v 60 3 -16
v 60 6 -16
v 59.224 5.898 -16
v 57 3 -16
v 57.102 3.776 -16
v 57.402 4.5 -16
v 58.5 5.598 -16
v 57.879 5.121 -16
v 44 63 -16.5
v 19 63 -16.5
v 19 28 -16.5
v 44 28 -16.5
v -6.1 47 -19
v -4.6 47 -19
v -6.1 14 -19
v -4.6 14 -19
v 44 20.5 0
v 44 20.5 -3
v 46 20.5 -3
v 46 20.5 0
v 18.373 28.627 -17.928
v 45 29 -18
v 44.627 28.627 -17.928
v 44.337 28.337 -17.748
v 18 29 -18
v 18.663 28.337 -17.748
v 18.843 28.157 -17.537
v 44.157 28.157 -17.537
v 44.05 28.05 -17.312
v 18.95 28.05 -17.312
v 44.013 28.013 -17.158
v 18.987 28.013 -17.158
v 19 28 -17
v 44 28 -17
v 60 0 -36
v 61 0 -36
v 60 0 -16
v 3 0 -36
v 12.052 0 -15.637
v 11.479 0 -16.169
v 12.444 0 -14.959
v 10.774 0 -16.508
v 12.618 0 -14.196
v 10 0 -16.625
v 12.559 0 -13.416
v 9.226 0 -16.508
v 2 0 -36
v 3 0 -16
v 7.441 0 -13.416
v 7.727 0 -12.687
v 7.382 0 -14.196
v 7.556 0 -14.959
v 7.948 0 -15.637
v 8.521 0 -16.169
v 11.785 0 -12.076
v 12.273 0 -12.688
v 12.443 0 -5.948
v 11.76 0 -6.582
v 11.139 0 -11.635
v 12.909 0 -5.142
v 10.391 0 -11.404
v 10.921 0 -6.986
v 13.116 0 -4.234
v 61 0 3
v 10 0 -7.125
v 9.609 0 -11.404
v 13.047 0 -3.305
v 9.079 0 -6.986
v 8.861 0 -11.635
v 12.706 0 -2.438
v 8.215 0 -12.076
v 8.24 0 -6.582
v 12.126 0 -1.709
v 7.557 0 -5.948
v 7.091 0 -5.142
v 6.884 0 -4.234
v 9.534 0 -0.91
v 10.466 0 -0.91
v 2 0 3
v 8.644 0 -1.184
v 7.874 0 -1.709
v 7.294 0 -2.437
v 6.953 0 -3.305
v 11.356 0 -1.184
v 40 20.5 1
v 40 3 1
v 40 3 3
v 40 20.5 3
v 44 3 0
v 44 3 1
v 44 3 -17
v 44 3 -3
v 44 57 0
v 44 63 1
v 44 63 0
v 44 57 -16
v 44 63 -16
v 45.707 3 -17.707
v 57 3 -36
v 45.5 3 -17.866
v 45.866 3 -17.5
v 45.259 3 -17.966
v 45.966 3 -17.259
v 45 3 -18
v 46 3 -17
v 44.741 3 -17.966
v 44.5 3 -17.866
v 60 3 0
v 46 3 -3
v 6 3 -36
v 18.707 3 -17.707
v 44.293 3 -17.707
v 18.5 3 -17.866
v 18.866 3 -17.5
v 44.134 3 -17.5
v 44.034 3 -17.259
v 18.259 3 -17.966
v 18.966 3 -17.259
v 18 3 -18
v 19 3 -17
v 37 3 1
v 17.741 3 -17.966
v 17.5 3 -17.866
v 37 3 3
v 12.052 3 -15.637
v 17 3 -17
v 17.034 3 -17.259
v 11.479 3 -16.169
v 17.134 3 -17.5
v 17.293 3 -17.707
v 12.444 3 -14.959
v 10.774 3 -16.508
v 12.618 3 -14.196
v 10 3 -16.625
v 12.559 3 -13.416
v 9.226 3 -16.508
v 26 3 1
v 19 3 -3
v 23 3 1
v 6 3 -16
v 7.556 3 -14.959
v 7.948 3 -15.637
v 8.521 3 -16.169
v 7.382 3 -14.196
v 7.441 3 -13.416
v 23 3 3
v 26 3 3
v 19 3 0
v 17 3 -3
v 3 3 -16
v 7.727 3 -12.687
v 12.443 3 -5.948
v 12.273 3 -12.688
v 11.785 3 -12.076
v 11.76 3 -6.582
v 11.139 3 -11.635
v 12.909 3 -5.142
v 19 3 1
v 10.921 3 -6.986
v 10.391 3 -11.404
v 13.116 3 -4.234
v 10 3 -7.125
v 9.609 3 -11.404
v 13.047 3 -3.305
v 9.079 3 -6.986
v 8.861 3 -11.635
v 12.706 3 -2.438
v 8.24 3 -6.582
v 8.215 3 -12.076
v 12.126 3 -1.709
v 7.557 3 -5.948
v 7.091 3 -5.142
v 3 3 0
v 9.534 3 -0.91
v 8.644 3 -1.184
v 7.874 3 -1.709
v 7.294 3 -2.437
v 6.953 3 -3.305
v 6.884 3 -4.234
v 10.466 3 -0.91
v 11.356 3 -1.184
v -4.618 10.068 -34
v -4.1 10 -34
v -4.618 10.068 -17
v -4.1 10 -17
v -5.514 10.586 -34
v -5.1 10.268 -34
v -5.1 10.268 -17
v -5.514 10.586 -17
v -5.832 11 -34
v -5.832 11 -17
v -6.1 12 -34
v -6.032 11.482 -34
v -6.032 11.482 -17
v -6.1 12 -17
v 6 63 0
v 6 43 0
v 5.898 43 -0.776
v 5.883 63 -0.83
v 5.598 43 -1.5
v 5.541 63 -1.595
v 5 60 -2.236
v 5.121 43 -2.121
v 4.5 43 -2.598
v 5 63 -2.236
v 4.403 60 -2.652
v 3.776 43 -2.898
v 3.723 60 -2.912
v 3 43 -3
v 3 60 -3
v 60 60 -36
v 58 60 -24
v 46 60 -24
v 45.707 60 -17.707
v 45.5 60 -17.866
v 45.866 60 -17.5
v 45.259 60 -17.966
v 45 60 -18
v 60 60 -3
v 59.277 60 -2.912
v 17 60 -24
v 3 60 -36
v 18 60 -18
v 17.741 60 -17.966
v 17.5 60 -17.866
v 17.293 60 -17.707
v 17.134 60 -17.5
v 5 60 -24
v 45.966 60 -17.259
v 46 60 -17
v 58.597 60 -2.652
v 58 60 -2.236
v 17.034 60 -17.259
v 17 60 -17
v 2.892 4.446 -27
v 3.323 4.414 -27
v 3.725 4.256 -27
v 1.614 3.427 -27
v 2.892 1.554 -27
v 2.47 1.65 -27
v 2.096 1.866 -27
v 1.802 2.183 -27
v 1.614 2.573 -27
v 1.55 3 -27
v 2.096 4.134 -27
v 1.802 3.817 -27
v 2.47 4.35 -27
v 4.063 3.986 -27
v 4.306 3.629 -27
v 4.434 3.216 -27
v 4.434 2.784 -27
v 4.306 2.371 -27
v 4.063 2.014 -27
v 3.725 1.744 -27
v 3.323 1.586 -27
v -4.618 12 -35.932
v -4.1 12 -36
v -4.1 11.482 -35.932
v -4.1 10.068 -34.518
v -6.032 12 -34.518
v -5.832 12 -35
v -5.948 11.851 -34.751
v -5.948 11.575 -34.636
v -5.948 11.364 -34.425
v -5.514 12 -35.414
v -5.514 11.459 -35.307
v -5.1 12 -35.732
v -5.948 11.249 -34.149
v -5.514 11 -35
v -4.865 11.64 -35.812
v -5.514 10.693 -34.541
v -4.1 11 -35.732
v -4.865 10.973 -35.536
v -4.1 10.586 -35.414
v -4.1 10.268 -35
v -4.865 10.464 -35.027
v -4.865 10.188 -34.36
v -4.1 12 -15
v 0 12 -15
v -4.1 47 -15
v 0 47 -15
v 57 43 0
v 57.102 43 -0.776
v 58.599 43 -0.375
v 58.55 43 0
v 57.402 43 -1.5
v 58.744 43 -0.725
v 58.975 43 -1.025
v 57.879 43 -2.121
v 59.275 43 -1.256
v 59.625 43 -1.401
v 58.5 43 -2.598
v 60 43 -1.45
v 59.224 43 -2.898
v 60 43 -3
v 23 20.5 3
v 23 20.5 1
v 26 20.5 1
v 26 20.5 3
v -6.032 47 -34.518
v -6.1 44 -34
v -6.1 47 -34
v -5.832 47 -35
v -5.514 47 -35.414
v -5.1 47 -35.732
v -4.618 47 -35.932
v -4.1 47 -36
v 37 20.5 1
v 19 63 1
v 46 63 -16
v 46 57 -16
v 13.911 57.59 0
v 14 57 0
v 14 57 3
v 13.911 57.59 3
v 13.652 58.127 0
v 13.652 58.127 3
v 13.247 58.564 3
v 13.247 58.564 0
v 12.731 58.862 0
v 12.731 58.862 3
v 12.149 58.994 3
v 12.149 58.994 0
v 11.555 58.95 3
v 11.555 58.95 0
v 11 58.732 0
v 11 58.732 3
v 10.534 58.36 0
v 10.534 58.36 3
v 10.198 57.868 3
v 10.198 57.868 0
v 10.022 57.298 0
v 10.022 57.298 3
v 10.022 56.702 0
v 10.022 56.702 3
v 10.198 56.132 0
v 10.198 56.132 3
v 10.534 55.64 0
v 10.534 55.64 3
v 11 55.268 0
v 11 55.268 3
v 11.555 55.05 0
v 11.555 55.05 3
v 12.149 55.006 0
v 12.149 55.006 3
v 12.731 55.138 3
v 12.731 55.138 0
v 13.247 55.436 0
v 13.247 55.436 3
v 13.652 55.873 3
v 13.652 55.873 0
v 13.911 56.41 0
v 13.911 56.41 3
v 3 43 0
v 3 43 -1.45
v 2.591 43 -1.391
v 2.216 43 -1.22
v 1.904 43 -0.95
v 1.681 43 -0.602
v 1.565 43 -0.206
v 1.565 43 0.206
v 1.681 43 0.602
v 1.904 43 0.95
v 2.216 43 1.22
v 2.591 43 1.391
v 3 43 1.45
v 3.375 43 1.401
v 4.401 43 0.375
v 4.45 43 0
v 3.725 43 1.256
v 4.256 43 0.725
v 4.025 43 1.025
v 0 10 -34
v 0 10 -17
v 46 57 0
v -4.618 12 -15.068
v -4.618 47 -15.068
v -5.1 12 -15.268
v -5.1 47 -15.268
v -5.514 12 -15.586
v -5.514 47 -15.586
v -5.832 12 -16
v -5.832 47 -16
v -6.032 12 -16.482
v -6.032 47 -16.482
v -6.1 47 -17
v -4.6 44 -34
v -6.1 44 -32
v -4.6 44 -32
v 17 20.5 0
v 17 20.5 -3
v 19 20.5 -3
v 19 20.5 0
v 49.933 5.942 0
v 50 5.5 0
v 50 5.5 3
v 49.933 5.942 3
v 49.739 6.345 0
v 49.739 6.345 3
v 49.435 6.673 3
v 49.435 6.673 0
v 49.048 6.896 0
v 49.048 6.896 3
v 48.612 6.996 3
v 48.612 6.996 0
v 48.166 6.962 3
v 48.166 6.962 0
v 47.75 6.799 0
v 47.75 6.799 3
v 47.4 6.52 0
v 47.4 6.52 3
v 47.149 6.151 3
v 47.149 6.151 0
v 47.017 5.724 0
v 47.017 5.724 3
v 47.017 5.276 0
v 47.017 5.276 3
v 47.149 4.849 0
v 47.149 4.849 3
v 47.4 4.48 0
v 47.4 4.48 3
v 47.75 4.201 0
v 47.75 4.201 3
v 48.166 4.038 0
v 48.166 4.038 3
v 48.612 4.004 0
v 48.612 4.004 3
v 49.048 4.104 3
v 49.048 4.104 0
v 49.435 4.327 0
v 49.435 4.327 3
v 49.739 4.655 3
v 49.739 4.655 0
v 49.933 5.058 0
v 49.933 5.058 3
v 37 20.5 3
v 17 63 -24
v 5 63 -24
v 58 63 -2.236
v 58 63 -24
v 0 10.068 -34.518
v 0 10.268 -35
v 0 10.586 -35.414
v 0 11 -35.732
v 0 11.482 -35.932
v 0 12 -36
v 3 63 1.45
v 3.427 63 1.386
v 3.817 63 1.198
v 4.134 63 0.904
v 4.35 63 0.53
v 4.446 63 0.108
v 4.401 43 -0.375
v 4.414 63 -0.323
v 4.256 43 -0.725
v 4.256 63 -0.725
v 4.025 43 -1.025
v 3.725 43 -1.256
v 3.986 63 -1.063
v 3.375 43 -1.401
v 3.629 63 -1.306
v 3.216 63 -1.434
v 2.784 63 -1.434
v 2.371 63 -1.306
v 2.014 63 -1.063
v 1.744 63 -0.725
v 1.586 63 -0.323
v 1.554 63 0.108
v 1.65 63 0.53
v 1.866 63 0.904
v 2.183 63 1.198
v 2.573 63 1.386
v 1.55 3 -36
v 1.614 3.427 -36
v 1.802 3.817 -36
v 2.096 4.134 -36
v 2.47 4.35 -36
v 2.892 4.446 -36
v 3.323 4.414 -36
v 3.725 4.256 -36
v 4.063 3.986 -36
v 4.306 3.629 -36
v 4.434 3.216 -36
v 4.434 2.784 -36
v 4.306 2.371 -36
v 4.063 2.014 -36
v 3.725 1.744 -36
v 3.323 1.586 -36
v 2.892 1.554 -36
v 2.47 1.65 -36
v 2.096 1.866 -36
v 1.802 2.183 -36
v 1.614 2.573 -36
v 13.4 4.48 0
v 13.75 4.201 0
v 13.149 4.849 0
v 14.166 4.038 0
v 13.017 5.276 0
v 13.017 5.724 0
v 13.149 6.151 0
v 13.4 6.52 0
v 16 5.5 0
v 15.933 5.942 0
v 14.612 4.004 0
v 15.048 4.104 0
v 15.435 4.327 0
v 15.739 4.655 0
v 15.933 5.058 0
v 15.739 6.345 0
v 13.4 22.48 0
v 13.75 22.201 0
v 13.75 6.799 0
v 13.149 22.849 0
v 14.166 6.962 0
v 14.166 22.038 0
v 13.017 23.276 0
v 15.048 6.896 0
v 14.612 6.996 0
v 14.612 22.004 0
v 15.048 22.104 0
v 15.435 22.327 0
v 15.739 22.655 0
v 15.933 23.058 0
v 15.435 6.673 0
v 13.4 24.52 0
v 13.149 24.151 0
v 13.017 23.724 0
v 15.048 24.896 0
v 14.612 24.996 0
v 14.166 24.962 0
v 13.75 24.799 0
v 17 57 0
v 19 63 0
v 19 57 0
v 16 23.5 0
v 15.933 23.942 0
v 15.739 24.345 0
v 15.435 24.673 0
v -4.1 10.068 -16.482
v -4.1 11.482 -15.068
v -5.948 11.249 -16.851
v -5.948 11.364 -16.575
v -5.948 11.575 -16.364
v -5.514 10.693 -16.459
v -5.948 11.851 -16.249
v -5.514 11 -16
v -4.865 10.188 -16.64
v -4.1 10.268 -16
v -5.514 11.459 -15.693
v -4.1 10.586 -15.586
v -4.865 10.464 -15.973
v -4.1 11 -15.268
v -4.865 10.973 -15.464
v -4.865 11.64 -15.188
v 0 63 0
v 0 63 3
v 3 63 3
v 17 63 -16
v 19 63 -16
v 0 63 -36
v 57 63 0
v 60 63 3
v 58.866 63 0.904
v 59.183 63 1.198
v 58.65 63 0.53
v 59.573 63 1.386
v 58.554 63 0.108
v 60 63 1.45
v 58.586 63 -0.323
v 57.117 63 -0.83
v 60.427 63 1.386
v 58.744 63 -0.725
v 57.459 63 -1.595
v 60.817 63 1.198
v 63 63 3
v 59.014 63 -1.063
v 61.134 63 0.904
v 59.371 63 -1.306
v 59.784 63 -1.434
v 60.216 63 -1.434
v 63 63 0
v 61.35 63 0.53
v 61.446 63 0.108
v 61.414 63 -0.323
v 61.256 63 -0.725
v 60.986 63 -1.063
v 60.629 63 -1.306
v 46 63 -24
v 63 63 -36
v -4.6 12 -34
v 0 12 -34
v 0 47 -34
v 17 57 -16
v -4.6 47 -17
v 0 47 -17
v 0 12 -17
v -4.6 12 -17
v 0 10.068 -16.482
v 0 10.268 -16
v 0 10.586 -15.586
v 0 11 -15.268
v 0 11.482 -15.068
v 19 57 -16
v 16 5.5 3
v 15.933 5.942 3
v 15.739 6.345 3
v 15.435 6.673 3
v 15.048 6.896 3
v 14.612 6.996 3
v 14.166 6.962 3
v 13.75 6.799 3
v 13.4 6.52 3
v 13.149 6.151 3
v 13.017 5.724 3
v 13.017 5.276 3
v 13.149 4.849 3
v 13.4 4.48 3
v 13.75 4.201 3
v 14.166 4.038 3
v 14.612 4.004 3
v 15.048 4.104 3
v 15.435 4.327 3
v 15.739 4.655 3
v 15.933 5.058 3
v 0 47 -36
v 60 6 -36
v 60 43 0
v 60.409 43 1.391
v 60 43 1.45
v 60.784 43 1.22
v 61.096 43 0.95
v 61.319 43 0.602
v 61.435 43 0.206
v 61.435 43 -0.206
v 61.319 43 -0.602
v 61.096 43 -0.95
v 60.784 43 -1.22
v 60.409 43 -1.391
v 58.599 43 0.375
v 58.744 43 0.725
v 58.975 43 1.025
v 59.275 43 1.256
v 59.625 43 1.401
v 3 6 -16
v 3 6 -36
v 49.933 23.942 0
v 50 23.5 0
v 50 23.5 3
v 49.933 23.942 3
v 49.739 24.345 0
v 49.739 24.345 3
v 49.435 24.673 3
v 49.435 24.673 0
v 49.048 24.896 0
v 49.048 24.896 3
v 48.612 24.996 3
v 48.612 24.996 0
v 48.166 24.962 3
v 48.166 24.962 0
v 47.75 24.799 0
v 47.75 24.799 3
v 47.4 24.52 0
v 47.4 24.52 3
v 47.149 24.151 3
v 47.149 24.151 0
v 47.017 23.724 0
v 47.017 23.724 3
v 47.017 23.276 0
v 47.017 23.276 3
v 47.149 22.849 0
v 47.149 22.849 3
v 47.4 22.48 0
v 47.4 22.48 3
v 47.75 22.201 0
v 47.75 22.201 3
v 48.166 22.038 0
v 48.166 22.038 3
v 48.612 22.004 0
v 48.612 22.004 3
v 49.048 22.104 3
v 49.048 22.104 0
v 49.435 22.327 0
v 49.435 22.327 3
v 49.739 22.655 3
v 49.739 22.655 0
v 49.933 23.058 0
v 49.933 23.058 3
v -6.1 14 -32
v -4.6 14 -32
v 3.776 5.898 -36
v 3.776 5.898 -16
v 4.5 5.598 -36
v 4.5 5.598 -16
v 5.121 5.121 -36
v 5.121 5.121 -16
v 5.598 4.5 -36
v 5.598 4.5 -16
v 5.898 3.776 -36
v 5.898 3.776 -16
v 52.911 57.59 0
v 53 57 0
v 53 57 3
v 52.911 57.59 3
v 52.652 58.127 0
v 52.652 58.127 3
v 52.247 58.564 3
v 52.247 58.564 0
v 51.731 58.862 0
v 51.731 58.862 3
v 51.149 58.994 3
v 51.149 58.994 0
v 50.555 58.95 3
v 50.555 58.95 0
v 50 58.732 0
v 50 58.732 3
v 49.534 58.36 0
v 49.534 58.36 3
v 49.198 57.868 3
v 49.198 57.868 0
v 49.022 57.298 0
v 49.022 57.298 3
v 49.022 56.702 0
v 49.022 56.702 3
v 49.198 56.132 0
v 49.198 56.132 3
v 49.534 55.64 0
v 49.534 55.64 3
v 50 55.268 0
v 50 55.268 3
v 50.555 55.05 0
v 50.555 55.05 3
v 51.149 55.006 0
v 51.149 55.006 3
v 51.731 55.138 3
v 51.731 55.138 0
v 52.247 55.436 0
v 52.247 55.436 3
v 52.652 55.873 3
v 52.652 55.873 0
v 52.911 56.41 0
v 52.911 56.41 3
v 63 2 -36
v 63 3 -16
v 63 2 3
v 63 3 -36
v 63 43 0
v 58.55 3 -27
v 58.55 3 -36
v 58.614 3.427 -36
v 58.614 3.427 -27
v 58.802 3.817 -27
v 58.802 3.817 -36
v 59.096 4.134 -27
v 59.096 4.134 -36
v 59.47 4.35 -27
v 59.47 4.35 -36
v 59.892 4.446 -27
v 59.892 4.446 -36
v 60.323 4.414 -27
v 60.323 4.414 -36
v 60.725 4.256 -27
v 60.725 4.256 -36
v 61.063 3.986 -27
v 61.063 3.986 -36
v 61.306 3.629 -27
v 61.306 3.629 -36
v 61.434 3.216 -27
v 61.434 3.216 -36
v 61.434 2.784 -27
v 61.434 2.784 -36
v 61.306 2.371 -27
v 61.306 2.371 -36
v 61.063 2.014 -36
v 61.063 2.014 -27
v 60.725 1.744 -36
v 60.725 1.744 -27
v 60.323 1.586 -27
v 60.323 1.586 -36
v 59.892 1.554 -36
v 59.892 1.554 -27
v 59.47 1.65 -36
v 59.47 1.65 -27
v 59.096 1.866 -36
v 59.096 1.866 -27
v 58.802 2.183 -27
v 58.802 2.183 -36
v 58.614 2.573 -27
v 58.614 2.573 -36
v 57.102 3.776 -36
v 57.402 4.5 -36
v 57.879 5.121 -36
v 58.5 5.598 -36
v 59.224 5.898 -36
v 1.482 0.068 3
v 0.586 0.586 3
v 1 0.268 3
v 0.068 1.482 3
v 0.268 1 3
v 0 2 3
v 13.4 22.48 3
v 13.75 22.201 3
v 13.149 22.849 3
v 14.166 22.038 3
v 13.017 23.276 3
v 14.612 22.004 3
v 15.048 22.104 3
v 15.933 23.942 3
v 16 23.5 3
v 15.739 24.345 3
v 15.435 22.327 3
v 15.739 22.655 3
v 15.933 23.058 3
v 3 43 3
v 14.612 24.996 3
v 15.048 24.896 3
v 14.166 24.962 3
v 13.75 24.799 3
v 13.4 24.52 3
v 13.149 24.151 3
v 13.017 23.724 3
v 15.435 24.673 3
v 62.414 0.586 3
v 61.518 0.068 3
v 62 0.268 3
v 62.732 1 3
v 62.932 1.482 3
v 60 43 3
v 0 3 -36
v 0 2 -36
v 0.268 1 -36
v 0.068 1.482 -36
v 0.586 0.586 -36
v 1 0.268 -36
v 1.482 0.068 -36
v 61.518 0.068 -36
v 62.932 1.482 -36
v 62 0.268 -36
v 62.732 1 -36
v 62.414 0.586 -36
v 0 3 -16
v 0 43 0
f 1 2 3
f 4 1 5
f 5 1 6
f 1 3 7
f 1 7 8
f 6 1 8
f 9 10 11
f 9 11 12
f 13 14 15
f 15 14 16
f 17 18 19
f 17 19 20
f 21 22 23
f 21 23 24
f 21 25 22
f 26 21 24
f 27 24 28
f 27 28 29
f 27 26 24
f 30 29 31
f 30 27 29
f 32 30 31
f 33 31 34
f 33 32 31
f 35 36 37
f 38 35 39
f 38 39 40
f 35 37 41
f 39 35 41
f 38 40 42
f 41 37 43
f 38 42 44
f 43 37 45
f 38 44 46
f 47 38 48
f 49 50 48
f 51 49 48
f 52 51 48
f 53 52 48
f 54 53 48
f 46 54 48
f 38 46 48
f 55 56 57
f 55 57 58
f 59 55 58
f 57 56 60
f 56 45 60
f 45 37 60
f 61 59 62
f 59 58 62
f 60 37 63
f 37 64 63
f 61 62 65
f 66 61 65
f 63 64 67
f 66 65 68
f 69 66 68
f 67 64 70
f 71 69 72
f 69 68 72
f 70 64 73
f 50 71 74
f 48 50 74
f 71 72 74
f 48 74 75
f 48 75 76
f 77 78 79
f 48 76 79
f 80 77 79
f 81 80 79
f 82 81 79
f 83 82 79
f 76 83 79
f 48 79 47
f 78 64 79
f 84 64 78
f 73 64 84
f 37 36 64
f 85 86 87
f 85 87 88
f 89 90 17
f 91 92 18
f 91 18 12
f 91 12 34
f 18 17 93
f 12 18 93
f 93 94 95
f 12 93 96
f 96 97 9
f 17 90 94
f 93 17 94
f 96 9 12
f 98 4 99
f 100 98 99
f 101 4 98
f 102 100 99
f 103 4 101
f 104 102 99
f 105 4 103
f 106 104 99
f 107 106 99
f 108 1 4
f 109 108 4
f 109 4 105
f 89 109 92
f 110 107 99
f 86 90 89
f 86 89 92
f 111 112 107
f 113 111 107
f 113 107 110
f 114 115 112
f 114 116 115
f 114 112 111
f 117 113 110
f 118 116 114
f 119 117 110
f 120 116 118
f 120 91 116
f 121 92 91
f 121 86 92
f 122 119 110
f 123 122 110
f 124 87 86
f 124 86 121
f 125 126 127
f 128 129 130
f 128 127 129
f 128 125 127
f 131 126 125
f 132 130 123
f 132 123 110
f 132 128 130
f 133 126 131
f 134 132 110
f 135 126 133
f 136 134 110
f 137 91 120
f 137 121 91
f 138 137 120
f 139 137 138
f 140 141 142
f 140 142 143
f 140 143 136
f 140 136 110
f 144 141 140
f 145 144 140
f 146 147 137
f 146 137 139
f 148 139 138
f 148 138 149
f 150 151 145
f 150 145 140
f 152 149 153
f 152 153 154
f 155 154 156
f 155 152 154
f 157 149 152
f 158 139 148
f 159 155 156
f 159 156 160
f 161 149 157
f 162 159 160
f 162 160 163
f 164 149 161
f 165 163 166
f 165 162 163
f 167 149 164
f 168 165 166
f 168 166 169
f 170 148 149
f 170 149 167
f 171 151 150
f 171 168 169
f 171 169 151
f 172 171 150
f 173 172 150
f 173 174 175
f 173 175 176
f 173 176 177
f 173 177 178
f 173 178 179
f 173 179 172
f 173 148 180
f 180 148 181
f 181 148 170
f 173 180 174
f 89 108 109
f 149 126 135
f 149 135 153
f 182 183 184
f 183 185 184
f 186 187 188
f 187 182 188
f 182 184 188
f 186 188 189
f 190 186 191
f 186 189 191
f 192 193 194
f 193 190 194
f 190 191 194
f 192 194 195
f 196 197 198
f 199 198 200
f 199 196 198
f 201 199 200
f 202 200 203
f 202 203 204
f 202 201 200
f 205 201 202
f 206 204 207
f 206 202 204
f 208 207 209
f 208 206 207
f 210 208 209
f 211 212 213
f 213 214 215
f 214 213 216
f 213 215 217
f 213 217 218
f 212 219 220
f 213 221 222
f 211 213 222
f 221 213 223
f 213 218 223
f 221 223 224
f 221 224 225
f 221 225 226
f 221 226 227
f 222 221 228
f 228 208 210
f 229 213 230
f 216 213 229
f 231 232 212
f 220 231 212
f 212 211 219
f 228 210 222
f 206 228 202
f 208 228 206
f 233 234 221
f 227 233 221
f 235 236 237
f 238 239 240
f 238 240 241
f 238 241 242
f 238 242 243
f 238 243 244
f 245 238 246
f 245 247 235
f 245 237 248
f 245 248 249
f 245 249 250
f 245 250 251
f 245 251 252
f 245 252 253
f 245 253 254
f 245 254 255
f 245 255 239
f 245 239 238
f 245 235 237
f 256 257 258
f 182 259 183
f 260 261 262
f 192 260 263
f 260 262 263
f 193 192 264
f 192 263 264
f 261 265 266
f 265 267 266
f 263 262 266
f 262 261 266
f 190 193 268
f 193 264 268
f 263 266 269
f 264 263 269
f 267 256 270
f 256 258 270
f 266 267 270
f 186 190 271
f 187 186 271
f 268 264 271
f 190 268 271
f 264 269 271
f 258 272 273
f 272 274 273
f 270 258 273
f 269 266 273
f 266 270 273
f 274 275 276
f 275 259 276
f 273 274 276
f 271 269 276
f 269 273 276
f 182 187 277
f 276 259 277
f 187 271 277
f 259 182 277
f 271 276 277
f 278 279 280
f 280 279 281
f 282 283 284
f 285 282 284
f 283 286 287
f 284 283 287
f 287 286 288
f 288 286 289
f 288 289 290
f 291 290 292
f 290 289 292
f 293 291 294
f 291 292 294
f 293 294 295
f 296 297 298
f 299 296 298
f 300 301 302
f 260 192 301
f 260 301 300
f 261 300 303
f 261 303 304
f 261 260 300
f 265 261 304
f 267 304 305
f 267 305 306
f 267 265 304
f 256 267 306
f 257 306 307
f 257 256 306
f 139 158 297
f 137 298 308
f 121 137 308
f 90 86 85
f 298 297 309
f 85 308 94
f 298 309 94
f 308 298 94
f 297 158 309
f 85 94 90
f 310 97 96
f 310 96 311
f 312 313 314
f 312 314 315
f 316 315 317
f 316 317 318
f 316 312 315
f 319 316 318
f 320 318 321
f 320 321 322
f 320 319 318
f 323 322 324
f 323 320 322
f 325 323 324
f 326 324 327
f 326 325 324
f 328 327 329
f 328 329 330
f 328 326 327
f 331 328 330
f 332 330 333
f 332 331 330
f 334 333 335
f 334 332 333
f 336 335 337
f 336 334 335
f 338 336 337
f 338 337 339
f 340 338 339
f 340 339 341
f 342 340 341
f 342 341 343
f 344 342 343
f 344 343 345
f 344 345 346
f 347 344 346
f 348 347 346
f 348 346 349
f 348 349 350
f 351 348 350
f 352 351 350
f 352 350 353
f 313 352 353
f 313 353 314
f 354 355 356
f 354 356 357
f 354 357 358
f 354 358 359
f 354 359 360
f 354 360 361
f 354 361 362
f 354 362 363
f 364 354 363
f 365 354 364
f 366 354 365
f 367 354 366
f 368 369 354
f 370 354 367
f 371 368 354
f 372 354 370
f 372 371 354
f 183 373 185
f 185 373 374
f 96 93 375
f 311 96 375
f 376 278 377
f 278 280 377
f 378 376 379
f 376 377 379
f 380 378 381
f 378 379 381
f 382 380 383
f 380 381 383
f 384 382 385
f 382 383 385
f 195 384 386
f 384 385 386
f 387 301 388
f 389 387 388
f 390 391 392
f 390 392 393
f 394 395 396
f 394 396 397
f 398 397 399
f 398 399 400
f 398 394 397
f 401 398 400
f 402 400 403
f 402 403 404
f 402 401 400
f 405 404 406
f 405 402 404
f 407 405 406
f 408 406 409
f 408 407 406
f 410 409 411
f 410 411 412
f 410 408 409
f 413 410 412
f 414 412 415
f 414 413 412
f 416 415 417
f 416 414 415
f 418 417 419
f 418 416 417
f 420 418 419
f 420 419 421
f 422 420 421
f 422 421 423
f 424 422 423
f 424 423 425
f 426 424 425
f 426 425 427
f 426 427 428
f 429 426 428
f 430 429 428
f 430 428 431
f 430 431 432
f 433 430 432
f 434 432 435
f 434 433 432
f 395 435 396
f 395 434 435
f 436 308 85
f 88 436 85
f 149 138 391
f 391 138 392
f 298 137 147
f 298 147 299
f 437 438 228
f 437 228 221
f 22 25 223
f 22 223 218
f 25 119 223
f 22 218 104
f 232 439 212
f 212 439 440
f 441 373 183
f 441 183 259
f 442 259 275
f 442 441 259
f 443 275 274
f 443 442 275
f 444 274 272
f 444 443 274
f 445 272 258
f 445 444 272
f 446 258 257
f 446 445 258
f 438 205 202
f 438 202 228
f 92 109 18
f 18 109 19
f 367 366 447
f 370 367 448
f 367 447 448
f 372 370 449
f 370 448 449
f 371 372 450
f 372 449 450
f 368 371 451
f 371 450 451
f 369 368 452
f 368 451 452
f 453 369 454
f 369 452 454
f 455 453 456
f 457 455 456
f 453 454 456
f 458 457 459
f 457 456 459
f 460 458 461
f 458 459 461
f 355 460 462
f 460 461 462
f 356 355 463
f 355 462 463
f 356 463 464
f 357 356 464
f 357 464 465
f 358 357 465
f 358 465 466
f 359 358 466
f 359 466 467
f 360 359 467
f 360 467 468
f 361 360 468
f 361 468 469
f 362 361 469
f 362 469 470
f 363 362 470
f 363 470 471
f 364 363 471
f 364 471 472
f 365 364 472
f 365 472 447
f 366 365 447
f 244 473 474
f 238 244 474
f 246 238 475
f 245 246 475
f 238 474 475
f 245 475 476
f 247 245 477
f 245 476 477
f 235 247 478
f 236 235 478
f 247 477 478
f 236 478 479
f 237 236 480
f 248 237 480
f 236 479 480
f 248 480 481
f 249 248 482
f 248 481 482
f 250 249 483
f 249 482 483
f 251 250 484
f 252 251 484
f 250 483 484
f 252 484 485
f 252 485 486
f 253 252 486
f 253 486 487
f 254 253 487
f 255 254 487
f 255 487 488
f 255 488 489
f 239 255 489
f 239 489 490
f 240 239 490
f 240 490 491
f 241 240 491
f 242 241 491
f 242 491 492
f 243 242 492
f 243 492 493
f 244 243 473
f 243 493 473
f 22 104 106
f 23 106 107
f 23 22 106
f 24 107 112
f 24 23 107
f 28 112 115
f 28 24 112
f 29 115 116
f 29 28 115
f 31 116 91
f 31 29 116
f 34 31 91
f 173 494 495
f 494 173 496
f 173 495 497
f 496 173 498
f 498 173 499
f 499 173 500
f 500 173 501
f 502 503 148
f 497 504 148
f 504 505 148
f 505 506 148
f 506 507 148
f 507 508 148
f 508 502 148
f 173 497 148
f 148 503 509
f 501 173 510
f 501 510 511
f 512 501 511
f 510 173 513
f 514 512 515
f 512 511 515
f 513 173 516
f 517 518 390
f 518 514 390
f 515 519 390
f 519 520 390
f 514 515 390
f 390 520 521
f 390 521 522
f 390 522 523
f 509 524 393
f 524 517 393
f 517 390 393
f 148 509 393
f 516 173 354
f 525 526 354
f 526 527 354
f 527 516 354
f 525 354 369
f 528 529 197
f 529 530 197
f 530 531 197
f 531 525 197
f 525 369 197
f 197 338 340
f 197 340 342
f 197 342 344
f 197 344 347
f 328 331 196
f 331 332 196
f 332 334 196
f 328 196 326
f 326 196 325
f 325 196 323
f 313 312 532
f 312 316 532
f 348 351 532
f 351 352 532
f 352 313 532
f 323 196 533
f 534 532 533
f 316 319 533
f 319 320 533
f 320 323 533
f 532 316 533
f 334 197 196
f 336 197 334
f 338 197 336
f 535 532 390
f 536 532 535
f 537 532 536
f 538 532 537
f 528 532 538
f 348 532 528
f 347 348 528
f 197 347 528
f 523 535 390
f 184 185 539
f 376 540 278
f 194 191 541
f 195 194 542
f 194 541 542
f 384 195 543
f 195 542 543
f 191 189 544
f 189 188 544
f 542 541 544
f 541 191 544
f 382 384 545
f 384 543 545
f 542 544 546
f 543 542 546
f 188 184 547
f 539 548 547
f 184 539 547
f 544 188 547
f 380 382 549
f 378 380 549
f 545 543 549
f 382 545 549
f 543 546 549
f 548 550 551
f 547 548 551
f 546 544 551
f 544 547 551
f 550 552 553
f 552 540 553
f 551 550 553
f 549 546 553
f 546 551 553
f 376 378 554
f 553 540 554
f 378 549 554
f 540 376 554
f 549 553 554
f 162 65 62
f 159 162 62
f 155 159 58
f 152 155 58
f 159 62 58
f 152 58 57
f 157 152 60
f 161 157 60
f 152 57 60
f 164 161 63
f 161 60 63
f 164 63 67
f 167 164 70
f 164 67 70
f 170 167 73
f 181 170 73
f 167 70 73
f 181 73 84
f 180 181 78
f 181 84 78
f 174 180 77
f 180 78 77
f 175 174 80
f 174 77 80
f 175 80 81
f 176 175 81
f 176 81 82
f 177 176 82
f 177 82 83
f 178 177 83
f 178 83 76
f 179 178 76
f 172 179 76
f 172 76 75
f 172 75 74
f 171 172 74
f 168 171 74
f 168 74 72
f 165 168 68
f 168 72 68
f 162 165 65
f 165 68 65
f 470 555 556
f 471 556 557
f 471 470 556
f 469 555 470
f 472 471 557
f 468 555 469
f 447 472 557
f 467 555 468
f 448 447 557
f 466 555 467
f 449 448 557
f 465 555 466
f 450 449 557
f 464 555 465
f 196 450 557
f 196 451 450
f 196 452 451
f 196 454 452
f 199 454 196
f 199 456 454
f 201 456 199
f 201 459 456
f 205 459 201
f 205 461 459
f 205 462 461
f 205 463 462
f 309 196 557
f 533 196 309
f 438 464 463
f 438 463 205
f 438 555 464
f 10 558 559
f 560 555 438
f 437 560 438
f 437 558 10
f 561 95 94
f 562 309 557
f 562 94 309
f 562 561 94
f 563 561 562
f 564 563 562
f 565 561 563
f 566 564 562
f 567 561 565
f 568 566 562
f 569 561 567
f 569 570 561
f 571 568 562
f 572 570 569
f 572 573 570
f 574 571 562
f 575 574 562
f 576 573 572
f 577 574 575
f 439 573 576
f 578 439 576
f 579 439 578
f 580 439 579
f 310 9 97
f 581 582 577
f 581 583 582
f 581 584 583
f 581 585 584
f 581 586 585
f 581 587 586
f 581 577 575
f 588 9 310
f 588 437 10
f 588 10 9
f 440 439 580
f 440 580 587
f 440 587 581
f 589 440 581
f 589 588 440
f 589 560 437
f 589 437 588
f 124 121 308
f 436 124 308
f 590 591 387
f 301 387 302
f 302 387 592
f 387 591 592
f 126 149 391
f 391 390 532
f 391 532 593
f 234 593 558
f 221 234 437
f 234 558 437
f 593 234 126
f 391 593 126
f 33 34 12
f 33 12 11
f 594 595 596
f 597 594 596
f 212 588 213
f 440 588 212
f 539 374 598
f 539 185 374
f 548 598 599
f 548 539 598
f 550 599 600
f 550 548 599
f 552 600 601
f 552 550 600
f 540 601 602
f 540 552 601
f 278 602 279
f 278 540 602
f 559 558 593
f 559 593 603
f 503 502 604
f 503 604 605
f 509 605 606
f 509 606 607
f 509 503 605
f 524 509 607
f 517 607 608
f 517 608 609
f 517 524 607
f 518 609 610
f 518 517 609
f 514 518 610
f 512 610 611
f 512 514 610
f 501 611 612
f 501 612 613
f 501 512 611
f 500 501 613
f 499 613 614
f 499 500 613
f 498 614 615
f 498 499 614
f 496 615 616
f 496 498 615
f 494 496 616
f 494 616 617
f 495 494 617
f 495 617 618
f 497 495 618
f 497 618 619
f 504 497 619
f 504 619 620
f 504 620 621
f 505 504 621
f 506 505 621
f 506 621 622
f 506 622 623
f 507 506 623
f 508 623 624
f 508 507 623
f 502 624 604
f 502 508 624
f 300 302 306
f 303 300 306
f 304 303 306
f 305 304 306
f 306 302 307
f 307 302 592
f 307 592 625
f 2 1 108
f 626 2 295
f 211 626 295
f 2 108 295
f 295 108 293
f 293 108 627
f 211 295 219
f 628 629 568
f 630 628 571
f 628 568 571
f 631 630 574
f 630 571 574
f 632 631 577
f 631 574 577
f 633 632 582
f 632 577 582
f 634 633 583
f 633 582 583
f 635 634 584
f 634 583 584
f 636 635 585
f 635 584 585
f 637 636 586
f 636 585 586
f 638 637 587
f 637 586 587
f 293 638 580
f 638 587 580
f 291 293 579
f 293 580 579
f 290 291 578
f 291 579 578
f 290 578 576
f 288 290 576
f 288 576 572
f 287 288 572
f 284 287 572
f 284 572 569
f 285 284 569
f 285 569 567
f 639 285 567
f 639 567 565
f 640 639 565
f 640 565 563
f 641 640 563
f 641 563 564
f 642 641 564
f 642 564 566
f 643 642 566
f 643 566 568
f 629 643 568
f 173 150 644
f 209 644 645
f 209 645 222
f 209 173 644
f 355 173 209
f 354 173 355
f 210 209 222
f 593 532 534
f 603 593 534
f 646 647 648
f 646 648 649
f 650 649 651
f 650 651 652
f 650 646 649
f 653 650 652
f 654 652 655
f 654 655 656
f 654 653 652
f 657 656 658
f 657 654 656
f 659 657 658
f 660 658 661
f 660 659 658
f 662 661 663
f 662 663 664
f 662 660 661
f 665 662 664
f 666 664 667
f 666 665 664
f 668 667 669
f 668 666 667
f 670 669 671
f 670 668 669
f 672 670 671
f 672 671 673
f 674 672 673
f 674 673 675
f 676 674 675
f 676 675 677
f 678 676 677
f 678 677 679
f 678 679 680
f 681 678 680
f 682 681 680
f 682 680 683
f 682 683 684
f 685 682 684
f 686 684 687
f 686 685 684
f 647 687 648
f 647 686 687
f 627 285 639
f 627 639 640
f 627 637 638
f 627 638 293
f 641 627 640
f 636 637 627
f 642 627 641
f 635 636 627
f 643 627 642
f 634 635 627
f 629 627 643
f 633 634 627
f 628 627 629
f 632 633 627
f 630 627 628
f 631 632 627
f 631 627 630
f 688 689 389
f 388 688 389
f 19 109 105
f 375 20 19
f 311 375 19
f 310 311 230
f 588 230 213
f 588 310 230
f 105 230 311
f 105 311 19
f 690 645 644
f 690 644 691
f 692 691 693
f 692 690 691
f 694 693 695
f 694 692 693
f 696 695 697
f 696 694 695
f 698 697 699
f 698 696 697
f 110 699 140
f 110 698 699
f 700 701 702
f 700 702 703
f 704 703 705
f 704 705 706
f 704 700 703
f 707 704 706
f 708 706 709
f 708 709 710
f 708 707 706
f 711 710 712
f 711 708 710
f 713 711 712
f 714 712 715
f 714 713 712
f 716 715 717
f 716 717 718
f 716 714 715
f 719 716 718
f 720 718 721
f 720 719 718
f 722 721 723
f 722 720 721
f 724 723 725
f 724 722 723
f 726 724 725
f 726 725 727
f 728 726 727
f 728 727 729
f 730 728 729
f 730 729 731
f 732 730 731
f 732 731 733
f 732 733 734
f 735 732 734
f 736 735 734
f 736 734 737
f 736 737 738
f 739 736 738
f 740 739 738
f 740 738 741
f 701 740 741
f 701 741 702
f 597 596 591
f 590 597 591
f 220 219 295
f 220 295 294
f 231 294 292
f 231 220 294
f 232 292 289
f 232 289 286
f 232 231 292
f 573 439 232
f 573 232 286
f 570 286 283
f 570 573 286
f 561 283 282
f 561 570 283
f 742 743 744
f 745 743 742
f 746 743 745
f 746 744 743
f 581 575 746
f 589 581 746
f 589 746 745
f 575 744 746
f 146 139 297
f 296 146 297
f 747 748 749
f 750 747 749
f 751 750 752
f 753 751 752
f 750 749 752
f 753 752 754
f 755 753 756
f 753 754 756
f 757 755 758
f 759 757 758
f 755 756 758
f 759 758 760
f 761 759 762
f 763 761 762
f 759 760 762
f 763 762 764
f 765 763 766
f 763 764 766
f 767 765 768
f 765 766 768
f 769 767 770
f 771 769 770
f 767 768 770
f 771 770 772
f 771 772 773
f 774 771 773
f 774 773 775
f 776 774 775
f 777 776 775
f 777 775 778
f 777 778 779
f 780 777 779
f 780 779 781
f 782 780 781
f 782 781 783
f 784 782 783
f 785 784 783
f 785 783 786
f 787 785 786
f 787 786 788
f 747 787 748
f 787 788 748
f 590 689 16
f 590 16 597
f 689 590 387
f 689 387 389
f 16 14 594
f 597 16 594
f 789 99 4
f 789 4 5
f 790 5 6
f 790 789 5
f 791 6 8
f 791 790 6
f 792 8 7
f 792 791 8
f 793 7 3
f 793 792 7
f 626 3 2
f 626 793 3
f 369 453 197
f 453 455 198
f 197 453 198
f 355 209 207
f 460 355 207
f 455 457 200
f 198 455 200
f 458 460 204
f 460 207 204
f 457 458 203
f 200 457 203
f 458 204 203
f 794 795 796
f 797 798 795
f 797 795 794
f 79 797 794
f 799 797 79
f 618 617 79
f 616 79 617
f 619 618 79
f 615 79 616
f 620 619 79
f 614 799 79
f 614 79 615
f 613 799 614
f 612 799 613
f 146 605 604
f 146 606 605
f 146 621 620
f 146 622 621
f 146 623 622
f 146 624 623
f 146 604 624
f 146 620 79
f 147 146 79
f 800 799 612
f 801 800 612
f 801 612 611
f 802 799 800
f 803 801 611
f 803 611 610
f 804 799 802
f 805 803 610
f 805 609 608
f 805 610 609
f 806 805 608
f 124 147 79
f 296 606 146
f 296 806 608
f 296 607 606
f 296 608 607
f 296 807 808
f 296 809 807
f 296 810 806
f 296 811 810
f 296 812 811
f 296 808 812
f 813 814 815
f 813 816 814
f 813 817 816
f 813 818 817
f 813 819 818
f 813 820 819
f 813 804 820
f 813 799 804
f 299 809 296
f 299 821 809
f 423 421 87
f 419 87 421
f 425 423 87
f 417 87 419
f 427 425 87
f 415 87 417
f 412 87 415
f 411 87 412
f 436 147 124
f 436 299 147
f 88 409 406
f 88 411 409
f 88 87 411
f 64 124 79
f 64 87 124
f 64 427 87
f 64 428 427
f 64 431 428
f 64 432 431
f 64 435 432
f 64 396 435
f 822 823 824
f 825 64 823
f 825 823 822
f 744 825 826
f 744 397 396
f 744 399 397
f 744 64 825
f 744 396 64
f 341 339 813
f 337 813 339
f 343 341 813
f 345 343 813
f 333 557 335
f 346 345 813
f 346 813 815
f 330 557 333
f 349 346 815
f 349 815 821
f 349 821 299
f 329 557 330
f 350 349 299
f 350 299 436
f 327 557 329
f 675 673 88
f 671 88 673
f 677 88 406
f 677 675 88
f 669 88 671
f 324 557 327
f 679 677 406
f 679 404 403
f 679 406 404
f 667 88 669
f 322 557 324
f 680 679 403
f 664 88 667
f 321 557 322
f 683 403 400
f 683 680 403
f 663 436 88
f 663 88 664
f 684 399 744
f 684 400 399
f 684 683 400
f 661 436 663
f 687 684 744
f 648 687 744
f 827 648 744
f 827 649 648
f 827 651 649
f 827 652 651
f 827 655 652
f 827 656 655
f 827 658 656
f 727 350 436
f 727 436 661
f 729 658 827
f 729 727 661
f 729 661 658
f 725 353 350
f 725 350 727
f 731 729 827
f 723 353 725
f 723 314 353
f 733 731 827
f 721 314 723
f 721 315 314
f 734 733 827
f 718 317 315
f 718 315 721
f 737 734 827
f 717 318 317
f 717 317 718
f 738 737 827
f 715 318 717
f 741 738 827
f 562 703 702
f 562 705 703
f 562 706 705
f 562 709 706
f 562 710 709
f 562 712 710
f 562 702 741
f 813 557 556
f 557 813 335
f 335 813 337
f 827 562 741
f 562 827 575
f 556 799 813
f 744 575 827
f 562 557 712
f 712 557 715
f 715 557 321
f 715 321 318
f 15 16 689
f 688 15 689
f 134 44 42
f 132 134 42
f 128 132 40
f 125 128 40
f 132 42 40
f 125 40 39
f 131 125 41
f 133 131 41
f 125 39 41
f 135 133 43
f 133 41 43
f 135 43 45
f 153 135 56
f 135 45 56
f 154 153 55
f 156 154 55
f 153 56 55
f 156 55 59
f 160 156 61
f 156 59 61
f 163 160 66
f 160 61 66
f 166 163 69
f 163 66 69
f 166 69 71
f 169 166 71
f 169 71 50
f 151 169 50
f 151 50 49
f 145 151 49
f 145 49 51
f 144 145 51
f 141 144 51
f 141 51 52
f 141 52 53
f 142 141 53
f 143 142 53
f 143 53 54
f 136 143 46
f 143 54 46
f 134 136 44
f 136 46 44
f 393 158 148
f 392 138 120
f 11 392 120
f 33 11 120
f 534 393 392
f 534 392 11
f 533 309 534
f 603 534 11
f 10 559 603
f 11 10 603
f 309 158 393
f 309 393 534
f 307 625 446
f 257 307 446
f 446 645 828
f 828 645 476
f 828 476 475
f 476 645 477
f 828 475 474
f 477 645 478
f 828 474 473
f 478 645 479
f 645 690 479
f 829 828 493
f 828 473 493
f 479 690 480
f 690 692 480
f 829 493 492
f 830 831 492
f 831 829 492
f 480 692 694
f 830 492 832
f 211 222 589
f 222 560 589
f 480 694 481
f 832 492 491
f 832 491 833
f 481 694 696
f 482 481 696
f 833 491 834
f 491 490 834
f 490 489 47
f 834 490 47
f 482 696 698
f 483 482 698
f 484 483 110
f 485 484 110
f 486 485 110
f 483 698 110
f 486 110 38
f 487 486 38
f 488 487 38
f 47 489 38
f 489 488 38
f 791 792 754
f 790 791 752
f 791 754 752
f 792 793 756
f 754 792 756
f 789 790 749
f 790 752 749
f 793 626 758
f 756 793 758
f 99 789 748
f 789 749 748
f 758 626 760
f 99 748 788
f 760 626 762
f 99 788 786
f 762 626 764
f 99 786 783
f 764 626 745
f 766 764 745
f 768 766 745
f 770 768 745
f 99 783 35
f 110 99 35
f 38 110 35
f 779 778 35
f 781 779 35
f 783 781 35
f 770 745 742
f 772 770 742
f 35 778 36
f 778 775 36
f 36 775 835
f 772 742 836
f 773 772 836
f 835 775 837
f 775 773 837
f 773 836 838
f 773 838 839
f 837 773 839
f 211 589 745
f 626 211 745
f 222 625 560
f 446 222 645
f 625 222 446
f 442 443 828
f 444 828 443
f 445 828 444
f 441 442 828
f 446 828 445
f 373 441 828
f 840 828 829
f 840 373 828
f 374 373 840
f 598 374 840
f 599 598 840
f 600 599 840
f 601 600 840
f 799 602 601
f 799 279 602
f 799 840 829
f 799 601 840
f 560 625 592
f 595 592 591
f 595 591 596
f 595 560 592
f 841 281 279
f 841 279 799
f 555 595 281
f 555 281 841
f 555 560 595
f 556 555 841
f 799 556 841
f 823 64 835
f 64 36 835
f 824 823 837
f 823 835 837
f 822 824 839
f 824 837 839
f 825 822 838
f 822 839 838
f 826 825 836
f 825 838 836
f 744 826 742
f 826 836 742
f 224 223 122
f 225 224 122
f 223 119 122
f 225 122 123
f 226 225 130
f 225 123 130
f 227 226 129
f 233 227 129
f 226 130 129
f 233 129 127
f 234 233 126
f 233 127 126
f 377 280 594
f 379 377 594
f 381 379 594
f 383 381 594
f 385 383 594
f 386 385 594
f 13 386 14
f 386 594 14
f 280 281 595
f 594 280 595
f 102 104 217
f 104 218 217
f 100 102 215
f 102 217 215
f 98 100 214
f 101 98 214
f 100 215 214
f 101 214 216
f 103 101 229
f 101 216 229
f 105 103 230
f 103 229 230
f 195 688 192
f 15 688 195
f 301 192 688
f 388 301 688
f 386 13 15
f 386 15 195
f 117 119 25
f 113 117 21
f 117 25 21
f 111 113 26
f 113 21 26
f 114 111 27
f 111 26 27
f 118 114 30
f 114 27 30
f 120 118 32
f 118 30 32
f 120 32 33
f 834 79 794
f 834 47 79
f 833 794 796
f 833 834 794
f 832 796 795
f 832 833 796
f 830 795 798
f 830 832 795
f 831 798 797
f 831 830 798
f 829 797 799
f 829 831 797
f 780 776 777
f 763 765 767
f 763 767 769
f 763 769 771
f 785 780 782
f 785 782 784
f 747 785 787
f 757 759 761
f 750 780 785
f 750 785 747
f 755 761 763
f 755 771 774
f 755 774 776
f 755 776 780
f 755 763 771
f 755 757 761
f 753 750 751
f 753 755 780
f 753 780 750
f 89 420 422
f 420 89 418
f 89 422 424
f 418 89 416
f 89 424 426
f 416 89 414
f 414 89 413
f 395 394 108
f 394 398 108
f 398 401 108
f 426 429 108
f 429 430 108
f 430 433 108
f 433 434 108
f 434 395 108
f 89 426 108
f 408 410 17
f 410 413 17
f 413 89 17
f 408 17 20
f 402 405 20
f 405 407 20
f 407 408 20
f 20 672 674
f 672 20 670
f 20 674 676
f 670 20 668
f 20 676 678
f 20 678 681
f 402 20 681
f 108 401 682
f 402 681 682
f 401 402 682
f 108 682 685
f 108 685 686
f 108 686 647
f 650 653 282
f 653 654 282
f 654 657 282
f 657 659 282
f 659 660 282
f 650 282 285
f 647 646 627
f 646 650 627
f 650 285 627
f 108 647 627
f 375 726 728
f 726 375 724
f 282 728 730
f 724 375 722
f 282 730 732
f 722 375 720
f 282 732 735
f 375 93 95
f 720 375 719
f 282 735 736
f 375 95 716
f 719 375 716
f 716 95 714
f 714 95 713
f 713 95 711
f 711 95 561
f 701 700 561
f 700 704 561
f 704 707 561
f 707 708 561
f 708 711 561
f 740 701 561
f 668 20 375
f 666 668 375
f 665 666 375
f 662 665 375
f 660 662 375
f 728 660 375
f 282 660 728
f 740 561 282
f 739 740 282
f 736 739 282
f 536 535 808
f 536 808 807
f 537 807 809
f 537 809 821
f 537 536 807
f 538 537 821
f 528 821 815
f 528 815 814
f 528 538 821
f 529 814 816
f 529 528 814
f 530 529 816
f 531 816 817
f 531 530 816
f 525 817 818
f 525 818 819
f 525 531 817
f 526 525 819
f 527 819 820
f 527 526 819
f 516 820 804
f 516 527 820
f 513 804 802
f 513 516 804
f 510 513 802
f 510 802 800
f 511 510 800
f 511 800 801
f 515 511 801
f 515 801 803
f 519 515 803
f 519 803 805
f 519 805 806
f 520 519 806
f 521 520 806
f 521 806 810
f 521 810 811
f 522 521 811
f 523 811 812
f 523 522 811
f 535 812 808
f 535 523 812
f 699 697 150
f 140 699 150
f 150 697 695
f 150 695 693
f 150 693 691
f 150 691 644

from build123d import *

# Parameters (mm, degrees)
CROQUIS1_W               = 63
CROQUIS1_H               = 63
CROQUIS1_R               = 2
CROQUIS1_R_2             = 1.5
CROQUIS1_W_2             = 3
CROQUIS1_H_2             = 12
SALIENTE_EXTRUIR1_DEPTH  = 3
CROQUIS2_W               = 63
CROQUIS2_H               = 63
CROQUIS2_W_2             = 57
CROQUIS2_H_2             = 57
SALIENTE_EXTRUIR2_DEPTH  = 36
CROQUIS4_W               = 25
CROQUIS4_H               = 17
CORTAR_EXTRUIR2_DEPTH    = 60
SALIENTE_EXTRUIR8_DEPTH  = 60
CROQUIS8_W               = 3
CROQUIS8_H               = 12
CORTAR_EXTRUIR4_DEPTH    = 63
CROQUIS10_R              = 3
SALIENTE_EXTRUIR6_DEPTH  = 20
CROQUIS11_R              = 1.45
CORTAR_EXTRUIR6_DEPTH    = 9
REDONDEO1_R              = 2
CROQUIS13_W              = 25
CROQUIS13_H              = 25
CORTAR_EXTRUIR7_DEPTH    = 3
CROQUIS14_W              = 12
CROQUIS14_H              = 20
CORTAR_EXTRUIR8_DEPTH    = 5
CROQUIS15_R              = 3
SALIENTE_EXTRUIR9_DEPTH  = 20
CROQUIS16_W              = 15
CROQUIS16_H              = 18
SALIENTE_EXTRUIR10_DEPTH = 8
CROQUIS17_R              = 1.45
CORTAR_EXTRUIR9_DEPTH    = 20
CROQUIS18_W              = 3
CROQUIS18_H              = 12
SALIENTE_EXTRUIR11_DEPTH = 3
CROQUIS19_W              = 3
CROQUIS19_H              = 12
SALIENTE_EXTRUIR12_DEPTH = 3
REDONDEO3_R              = 1
CROQUIS20_R              = 3.125
CROQUIS20_R_2            = 2.625
CORTAR_EXTRUIR10_DEPTH   = 3
CROQUIS21_W              = 18.835847929
CROQUIS21_H              = 19.895765468
CORTAR_EXTRUIR11_DEPTH   = 18
CROQUIS22_R              = 1.45
SALIENTE_EXTRUIR13_DEPTH = 3
CROQUIS23_W              = 29
CROQUIS23_H              = 16
CORTAR_EXTRUIR12_DEPTH   = 6
CROQUIS24_W              = 3
CROQUIS24_H              = 5.5
CORTAR_EXTRUIR13_DEPTH   = 6
CROQUIS25_W              = 3
CROQUIS25_H              = 5.5
CORTAR_EXTRUIR14_DEPTH   = 30
CROQUIS26_W              = 25
CROQUIS26_H              = 0.5
CORTAR_EXTRUIR15_DEPTH   = 60
CROQUIS28_W              = 12
CROQUIS28_H              = 4
CORTAR_EXTRUIR16_DEPTH   = 6
SALIENTE_EXTRUIR14_DEPTH = 4.6
SALIENTE_EXTRUIR15_DEPTH = 1.5
REDONDEO4_R              = 2
CROQUIS31_W              = 2
CROQUIS31_H              = 3
CORTAR_EXTRUIR17_DEPTH   = 2


with BuildPart() as part:
    # Croquis1 → Saliente-Extruir1 (new body)
    with BuildSketch(Plane.XY):
        with Locations((31.5, 31.5)):
            Rectangle(CROQUIS1_W, CROQUIS1_H)
        with Locations((12, 57)):
            Circle(CROQUIS1_R, mode=Mode.SUBTRACT)
        with Locations((51, 57)):
            Circle(CROQUIS1_R, mode=Mode.SUBTRACT)
        with Locations((14.5, 5.5)):
            Circle(CROQUIS1_R_2, mode=Mode.SUBTRACT)
        with Locations((14.5, 23.5)):
            Circle(CROQUIS1_R_2, mode=Mode.SUBTRACT)
        with Locations((48.5, 5.5)):
            Circle(CROQUIS1_R_2, mode=Mode.SUBTRACT)
        with Locations((48.5, 23.5)):
            Circle(CROQUIS1_R_2, mode=Mode.SUBTRACT)
        with Locations((24.5, 14.5)):
            Rectangle(CROQUIS1_W_2, CROQUIS1_H_2, mode=Mode.SUBTRACT)
        with Locations((38.5, 14.5)):
            Rectangle(CROQUIS1_W_2, CROQUIS1_H_2, mode=Mode.SUBTRACT)
    extrude(amount=SALIENTE_EXTRUIR1_DEPTH)

    # Croquis2 → Saliente-Extruir2 (add)
    with BuildSketch(Plane(origin=(0, 0, 0), x_dir=(-1, 0, 0), z_dir=(0, 0, -1))):
        with Locations((-31.5, 31.5)):
            Rectangle(CROQUIS2_W, CROQUIS2_H)
        with Locations((-31.5, 31.5)):
            Rectangle(CROQUIS2_W_2, CROQUIS2_H_2, mode=Mode.SUBTRACT)
    extrude(amount=SALIENTE_EXTRUIR2_DEPTH)

    # Croquis4 → Cortar-Extruir2 (cut)
    with BuildSketch(Plane(origin=(0, 63, 0), x_dir=(1, 0, 0), z_dir=(0, 1, 0))):
        with Locations((31.5, 7.5)):
            Rectangle(CROQUIS4_W, CROQUIS4_H)
    extrude(amount=-CORTAR_EXTRUIR2_DEPTH, mode=Mode.SUBTRACT)

    # Croquis12 → Saliente-Extruir8 (add)
    with BuildSketch(Plane(origin=(0, 63, 0), x_dir=(1, 0, 0), z_dir=(0, 1, 0))):
        Polygon((19, -1), (17, -1), (17, 18), (46, 18), (46, -1), (44, -1), (44, 16), (19, 16), align=None)
    extrude(amount=-SALIENTE_EXTRUIR8_DEPTH)

    # Croquis8 → Cortar-Extruir4 (cut)
    with BuildSketch(Plane.ZY):
        with Locations((-1.5, 14.5)):
            Rectangle(CROQUIS8_W, CROQUIS8_H)
    extrude(amount=-CORTAR_EXTRUIR4_DEPTH, mode=Mode.SUBTRACT)

    # Croquis10 → Saliente-Extruir6 (add)
    with BuildSketch(Plane(origin=(0, 0, -36), x_dir=(-1, 0, 0), z_dir=(0, 0, -1))):
        with Locations((-3, 3)):
            Circle(CROQUIS10_R)
        with Locations((-60, 3)):
            Circle(CROQUIS10_R)
    extrude(amount=-SALIENTE_EXTRUIR6_DEPTH)

    # Croquis11 → Cortar-Extruir6 (cut)
    with BuildSketch(Plane(origin=(0, 0, -36), x_dir=(-1, 0, 0), z_dir=(0, 0, -1))):
        with Locations((-60, 3)):
            Circle(CROQUIS11_R)
        with Locations((-3, 3)):
            Circle(CROQUIS11_R)
    extrude(amount=-CORTAR_EXTRUIR6_DEPTH, mode=Mode.SUBTRACT)

    # Redondeo1
    redondeo1_edges = [part.edges().sort_by_distance(p)[0] for p in [
        (63, 0, -16.5),
        (0, 0, -16.5),
    ]]
    fillet(redondeo1_edges, radius=REDONDEO1_R)

    # Croquis13 → Cortar-Extruir7 (cut)
    with BuildSketch(Plane(origin=(0, 0, -18), x_dir=(-1, 0, 0), z_dir=(0, 0, -1))):
        with Locations((-31.5, 15.5)):
            Rectangle(CROQUIS13_W, CROQUIS13_H)
    extrude(amount=-CORTAR_EXTRUIR7_DEPTH, mode=Mode.SUBTRACT)

    # Croquis14 → Cortar-Extruir8 (cut)
    with BuildSketch(Plane(origin=(0, 63, 0), x_dir=(1, 0, 0), z_dir=(0, 1, 0))):
        with Locations((52, 10)):
            Rectangle(CROQUIS14_W, CROQUIS14_H)
        with Locations((11, 10)):
            Rectangle(CROQUIS14_W, CROQUIS14_H)
    extrude(amount=-CORTAR_EXTRUIR8_DEPTH, mode=Mode.SUBTRACT)

    # Croquis15 → Saliente-Extruir9 (add)
    with BuildSketch(Plane(origin=(0, 63, 0), x_dir=(1, 0, 0), z_dir=(0, 1, 0))):
        with Locations((3, 0)):
            Circle(CROQUIS15_R)
        with Locations((60, 0)):
            Circle(CROQUIS15_R)
        with Locations(Location((31.5, 31, 0), (0, 0, 270))):
            Circle(CROQUIS15_R)
    extrude(amount=-SALIENTE_EXTRUIR9_DEPTH)

    # Croquis16 → Saliente-Extruir10 (add)
    with BuildSketch(Plane.XZ.offset(-60)):
        with Locations((31.5, -27)):
            Rectangle(CROQUIS16_W, CROQUIS16_H)
    extrude(amount=SALIENTE_EXTRUIR10_DEPTH)

    # Croquis17 → Cortar-Extruir9 (cut)
    with BuildSketch(Plane(origin=(0, 63, 0), x_dir=(1, 0, 0), z_dir=(0, 1, 0))):
        with Locations(Location((3, 0, 0), (0, 0, 270))):
            Circle(CROQUIS17_R)
        with Locations(Location((60, 0, 0), (0, 0, 270))):
            Circle(CROQUIS17_R)
        with Locations(Location((31.5, 31, 0), (0, 0, 270))):
            Circle(CROQUIS17_R)
    extrude(amount=-CORTAR_EXTRUIR9_DEPTH, mode=Mode.SUBTRACT)

    # Croquis18 → Saliente-Extruir11 (add)
    with BuildSketch(Plane(origin=(63, 0, 0), x_dir=(0, 0, -1), z_dir=(1, 0, 0))):
        with Locations((1.5, 14.5)):
            Rectangle(CROQUIS18_W, CROQUIS18_H)
    extrude(amount=-SALIENTE_EXTRUIR11_DEPTH)

    # Croquis19 → Saliente-Extruir12 (add)
    with BuildSketch(Plane.ZY):
        with Locations((-1.5, 14.5)):
            Rectangle(CROQUIS19_W, CROQUIS19_H)
    extrude(amount=-SALIENTE_EXTRUIR12_DEPTH)

    # Redondeo3
    redondeo3_edges = [part.edges().sort_by_distance(p)[0] for p in [
        (31.5, 28, -18),
        (44, 15.5, -18),
        (19, 15.5, -18),
        (46, 31.5, -18),
        (17, 31.5, -18),
        (39, 52, -27),
        (24, 52, -27),
        (39, 56, -36),
        (24, 56, -36),
        (31.5, 52, -36),
    ]]
    fillet(redondeo3_edges, radius=REDONDEO3_R - 0.0001)  # a hair under: the kernel refuses the full size

    # Croquis20 → Cortar-Extruir10 (cut)
    with BuildSketch(Plane.XZ):
        with Locations(Location((10, -4, 0), (0, 0, 270))):
            Circle(CROQUIS20_R)
        with Locations(Location((10, -14, 0), (0, 0, 270))):
            Circle(CROQUIS20_R_2)
    extrude(amount=-CORTAR_EXTRUIR10_DEPTH, mode=Mode.SUBTRACT)

    # Croquis21 → Cortar-Extruir11 (cut)
    with BuildSketch(Plane(origin=(0, 0, -36), x_dir=(-1, 0, 0), z_dir=(0, 0, -1))):
        with Locations((-31.895496214, 50.052117266)):
            Rectangle(CROQUIS21_W, CROQUIS21_H)
    extrude(amount=-CORTAR_EXTRUIR11_DEPTH, mode=Mode.SUBTRACT)

    # Croquis22 → Saliente-Extruir13 (add)
    with BuildSketch(Plane(origin=(0, 63, 0), x_dir=(1, 0, 0), z_dir=(0, 1, 0))):
        with Locations((31.5, 31)):
            Circle(CROQUIS22_R)
    extrude(amount=-SALIENTE_EXTRUIR13_DEPTH)

    # Croquis23 → Cortar-Extruir12 (cut)
    with BuildSketch(Plane(origin=(0, 63, 0), x_dir=(1, 0, 0), z_dir=(0, 1, 0))):
        with Locations((31.5, 8)):
            Rectangle(CROQUIS23_W, CROQUIS23_H)
    extrude(amount=-CORTAR_EXTRUIR12_DEPTH, mode=Mode.SUBTRACT)

    # Croquis24 → Cortar-Extruir13 (cut)
    with BuildSketch(Plane(origin=(0, 0, 1), x_dir=(-1, 0, 0), z_dir=(0, 0, -1))):
        with Locations((-38.5, 5.75)):
            Rectangle(CROQUIS24_W, CROQUIS24_H)
        with Locations((-24.5, 5.75)):
            Rectangle(CROQUIS24_W, CROQUIS24_H)
    extrude(amount=-CORTAR_EXTRUIR13_DEPTH, mode=Mode.SUBTRACT)

    # Croquis25 → Cortar-Extruir14 (cut)
    with BuildSketch(Plane(origin=(46, 0, 0), x_dir=(0, 0, -1), z_dir=(1, 0, 0))):
        with Locations((1.5, 5.75)):
            Rectangle(CROQUIS25_W, CROQUIS25_H)
    extrude(amount=-CORTAR_EXTRUIR14_DEPTH, mode=Mode.SUBTRACT)

    # Croquis26 → Cortar-Extruir15 (cut)
    with BuildSketch(Plane(origin=(0, 63, 0), x_dir=(1, 0, 0), z_dir=(0, 1, 0))):
        with Locations((31.5, 16.25)):
            Rectangle(CROQUIS26_W, CROQUIS26_H)
    extrude(amount=-CORTAR_EXTRUIR15_DEPTH, mode=Mode.SUBTRACT)

    # Croquis28 → Cortar-Extruir16 (cut)
    with BuildSketch(Plane(origin=(0, 63, 0), x_dir=(1, 0, 0), z_dir=(0, 1, 0))):
        with Locations((11, 22)):
            Rectangle(CROQUIS28_W, CROQUIS28_H)
        with Locations((52, 22)):
            Rectangle(CROQUIS28_W, CROQUIS28_H)
    extrude(amount=-CORTAR_EXTRUIR16_DEPTH, mode=Mode.SUBTRACT)

    # Croquis29 → Saliente-Extruir14 (add)
    with BuildSketch(Plane.ZY):
        Polygon((-36, 10), (-15, 10), (-15, 12), (-15, 47), (-17, 47), (-17, 12), (-34, 12), (-34, 47), (-36, 47), (-36, 12), align=None)
    extrude(amount=SALIENTE_EXTRUIR14_DEPTH)

    # Croquis30 → Saliente-Extruir15 (add)
    with BuildSketch(Plane.ZY.offset(4.6)):
        Polygon((-36, 10), (-15, 10), (-15, 14), (-15, 47), (-19, 47), (-19, 14), (-32, 14), (-32, 47), (-36, 47), (-36, 14), align=None)
    extrude(amount=SALIENTE_EXTRUIR15_DEPTH)

    # Redondeo4
    redondeo4_edges = [part.edges().sort_by_distance(p)[0] for p in [
        (-3.05, 10, -36),
        (-3.05, 10, -15),
        (-6.1, 28.5, -36),
        (-6.1, 10, -25.5),
        (-6.1, 28.5, -15),
    ]]
    fillet(redondeo4_edges, radius=REDONDEO4_R)

    # Croquis31 → Cortar-Extruir17 (cut)
    with BuildSketch(Plane.ZY.offset(6.1)):
        with Locations((-33, 45.5)):
            Rectangle(CROQUIS31_W, CROQUIS31_H)
    extrude(amount=-CORTAR_EXTRUIR17_DEPTH, mode=Mode.SUBTRACT)


solid = part.part
